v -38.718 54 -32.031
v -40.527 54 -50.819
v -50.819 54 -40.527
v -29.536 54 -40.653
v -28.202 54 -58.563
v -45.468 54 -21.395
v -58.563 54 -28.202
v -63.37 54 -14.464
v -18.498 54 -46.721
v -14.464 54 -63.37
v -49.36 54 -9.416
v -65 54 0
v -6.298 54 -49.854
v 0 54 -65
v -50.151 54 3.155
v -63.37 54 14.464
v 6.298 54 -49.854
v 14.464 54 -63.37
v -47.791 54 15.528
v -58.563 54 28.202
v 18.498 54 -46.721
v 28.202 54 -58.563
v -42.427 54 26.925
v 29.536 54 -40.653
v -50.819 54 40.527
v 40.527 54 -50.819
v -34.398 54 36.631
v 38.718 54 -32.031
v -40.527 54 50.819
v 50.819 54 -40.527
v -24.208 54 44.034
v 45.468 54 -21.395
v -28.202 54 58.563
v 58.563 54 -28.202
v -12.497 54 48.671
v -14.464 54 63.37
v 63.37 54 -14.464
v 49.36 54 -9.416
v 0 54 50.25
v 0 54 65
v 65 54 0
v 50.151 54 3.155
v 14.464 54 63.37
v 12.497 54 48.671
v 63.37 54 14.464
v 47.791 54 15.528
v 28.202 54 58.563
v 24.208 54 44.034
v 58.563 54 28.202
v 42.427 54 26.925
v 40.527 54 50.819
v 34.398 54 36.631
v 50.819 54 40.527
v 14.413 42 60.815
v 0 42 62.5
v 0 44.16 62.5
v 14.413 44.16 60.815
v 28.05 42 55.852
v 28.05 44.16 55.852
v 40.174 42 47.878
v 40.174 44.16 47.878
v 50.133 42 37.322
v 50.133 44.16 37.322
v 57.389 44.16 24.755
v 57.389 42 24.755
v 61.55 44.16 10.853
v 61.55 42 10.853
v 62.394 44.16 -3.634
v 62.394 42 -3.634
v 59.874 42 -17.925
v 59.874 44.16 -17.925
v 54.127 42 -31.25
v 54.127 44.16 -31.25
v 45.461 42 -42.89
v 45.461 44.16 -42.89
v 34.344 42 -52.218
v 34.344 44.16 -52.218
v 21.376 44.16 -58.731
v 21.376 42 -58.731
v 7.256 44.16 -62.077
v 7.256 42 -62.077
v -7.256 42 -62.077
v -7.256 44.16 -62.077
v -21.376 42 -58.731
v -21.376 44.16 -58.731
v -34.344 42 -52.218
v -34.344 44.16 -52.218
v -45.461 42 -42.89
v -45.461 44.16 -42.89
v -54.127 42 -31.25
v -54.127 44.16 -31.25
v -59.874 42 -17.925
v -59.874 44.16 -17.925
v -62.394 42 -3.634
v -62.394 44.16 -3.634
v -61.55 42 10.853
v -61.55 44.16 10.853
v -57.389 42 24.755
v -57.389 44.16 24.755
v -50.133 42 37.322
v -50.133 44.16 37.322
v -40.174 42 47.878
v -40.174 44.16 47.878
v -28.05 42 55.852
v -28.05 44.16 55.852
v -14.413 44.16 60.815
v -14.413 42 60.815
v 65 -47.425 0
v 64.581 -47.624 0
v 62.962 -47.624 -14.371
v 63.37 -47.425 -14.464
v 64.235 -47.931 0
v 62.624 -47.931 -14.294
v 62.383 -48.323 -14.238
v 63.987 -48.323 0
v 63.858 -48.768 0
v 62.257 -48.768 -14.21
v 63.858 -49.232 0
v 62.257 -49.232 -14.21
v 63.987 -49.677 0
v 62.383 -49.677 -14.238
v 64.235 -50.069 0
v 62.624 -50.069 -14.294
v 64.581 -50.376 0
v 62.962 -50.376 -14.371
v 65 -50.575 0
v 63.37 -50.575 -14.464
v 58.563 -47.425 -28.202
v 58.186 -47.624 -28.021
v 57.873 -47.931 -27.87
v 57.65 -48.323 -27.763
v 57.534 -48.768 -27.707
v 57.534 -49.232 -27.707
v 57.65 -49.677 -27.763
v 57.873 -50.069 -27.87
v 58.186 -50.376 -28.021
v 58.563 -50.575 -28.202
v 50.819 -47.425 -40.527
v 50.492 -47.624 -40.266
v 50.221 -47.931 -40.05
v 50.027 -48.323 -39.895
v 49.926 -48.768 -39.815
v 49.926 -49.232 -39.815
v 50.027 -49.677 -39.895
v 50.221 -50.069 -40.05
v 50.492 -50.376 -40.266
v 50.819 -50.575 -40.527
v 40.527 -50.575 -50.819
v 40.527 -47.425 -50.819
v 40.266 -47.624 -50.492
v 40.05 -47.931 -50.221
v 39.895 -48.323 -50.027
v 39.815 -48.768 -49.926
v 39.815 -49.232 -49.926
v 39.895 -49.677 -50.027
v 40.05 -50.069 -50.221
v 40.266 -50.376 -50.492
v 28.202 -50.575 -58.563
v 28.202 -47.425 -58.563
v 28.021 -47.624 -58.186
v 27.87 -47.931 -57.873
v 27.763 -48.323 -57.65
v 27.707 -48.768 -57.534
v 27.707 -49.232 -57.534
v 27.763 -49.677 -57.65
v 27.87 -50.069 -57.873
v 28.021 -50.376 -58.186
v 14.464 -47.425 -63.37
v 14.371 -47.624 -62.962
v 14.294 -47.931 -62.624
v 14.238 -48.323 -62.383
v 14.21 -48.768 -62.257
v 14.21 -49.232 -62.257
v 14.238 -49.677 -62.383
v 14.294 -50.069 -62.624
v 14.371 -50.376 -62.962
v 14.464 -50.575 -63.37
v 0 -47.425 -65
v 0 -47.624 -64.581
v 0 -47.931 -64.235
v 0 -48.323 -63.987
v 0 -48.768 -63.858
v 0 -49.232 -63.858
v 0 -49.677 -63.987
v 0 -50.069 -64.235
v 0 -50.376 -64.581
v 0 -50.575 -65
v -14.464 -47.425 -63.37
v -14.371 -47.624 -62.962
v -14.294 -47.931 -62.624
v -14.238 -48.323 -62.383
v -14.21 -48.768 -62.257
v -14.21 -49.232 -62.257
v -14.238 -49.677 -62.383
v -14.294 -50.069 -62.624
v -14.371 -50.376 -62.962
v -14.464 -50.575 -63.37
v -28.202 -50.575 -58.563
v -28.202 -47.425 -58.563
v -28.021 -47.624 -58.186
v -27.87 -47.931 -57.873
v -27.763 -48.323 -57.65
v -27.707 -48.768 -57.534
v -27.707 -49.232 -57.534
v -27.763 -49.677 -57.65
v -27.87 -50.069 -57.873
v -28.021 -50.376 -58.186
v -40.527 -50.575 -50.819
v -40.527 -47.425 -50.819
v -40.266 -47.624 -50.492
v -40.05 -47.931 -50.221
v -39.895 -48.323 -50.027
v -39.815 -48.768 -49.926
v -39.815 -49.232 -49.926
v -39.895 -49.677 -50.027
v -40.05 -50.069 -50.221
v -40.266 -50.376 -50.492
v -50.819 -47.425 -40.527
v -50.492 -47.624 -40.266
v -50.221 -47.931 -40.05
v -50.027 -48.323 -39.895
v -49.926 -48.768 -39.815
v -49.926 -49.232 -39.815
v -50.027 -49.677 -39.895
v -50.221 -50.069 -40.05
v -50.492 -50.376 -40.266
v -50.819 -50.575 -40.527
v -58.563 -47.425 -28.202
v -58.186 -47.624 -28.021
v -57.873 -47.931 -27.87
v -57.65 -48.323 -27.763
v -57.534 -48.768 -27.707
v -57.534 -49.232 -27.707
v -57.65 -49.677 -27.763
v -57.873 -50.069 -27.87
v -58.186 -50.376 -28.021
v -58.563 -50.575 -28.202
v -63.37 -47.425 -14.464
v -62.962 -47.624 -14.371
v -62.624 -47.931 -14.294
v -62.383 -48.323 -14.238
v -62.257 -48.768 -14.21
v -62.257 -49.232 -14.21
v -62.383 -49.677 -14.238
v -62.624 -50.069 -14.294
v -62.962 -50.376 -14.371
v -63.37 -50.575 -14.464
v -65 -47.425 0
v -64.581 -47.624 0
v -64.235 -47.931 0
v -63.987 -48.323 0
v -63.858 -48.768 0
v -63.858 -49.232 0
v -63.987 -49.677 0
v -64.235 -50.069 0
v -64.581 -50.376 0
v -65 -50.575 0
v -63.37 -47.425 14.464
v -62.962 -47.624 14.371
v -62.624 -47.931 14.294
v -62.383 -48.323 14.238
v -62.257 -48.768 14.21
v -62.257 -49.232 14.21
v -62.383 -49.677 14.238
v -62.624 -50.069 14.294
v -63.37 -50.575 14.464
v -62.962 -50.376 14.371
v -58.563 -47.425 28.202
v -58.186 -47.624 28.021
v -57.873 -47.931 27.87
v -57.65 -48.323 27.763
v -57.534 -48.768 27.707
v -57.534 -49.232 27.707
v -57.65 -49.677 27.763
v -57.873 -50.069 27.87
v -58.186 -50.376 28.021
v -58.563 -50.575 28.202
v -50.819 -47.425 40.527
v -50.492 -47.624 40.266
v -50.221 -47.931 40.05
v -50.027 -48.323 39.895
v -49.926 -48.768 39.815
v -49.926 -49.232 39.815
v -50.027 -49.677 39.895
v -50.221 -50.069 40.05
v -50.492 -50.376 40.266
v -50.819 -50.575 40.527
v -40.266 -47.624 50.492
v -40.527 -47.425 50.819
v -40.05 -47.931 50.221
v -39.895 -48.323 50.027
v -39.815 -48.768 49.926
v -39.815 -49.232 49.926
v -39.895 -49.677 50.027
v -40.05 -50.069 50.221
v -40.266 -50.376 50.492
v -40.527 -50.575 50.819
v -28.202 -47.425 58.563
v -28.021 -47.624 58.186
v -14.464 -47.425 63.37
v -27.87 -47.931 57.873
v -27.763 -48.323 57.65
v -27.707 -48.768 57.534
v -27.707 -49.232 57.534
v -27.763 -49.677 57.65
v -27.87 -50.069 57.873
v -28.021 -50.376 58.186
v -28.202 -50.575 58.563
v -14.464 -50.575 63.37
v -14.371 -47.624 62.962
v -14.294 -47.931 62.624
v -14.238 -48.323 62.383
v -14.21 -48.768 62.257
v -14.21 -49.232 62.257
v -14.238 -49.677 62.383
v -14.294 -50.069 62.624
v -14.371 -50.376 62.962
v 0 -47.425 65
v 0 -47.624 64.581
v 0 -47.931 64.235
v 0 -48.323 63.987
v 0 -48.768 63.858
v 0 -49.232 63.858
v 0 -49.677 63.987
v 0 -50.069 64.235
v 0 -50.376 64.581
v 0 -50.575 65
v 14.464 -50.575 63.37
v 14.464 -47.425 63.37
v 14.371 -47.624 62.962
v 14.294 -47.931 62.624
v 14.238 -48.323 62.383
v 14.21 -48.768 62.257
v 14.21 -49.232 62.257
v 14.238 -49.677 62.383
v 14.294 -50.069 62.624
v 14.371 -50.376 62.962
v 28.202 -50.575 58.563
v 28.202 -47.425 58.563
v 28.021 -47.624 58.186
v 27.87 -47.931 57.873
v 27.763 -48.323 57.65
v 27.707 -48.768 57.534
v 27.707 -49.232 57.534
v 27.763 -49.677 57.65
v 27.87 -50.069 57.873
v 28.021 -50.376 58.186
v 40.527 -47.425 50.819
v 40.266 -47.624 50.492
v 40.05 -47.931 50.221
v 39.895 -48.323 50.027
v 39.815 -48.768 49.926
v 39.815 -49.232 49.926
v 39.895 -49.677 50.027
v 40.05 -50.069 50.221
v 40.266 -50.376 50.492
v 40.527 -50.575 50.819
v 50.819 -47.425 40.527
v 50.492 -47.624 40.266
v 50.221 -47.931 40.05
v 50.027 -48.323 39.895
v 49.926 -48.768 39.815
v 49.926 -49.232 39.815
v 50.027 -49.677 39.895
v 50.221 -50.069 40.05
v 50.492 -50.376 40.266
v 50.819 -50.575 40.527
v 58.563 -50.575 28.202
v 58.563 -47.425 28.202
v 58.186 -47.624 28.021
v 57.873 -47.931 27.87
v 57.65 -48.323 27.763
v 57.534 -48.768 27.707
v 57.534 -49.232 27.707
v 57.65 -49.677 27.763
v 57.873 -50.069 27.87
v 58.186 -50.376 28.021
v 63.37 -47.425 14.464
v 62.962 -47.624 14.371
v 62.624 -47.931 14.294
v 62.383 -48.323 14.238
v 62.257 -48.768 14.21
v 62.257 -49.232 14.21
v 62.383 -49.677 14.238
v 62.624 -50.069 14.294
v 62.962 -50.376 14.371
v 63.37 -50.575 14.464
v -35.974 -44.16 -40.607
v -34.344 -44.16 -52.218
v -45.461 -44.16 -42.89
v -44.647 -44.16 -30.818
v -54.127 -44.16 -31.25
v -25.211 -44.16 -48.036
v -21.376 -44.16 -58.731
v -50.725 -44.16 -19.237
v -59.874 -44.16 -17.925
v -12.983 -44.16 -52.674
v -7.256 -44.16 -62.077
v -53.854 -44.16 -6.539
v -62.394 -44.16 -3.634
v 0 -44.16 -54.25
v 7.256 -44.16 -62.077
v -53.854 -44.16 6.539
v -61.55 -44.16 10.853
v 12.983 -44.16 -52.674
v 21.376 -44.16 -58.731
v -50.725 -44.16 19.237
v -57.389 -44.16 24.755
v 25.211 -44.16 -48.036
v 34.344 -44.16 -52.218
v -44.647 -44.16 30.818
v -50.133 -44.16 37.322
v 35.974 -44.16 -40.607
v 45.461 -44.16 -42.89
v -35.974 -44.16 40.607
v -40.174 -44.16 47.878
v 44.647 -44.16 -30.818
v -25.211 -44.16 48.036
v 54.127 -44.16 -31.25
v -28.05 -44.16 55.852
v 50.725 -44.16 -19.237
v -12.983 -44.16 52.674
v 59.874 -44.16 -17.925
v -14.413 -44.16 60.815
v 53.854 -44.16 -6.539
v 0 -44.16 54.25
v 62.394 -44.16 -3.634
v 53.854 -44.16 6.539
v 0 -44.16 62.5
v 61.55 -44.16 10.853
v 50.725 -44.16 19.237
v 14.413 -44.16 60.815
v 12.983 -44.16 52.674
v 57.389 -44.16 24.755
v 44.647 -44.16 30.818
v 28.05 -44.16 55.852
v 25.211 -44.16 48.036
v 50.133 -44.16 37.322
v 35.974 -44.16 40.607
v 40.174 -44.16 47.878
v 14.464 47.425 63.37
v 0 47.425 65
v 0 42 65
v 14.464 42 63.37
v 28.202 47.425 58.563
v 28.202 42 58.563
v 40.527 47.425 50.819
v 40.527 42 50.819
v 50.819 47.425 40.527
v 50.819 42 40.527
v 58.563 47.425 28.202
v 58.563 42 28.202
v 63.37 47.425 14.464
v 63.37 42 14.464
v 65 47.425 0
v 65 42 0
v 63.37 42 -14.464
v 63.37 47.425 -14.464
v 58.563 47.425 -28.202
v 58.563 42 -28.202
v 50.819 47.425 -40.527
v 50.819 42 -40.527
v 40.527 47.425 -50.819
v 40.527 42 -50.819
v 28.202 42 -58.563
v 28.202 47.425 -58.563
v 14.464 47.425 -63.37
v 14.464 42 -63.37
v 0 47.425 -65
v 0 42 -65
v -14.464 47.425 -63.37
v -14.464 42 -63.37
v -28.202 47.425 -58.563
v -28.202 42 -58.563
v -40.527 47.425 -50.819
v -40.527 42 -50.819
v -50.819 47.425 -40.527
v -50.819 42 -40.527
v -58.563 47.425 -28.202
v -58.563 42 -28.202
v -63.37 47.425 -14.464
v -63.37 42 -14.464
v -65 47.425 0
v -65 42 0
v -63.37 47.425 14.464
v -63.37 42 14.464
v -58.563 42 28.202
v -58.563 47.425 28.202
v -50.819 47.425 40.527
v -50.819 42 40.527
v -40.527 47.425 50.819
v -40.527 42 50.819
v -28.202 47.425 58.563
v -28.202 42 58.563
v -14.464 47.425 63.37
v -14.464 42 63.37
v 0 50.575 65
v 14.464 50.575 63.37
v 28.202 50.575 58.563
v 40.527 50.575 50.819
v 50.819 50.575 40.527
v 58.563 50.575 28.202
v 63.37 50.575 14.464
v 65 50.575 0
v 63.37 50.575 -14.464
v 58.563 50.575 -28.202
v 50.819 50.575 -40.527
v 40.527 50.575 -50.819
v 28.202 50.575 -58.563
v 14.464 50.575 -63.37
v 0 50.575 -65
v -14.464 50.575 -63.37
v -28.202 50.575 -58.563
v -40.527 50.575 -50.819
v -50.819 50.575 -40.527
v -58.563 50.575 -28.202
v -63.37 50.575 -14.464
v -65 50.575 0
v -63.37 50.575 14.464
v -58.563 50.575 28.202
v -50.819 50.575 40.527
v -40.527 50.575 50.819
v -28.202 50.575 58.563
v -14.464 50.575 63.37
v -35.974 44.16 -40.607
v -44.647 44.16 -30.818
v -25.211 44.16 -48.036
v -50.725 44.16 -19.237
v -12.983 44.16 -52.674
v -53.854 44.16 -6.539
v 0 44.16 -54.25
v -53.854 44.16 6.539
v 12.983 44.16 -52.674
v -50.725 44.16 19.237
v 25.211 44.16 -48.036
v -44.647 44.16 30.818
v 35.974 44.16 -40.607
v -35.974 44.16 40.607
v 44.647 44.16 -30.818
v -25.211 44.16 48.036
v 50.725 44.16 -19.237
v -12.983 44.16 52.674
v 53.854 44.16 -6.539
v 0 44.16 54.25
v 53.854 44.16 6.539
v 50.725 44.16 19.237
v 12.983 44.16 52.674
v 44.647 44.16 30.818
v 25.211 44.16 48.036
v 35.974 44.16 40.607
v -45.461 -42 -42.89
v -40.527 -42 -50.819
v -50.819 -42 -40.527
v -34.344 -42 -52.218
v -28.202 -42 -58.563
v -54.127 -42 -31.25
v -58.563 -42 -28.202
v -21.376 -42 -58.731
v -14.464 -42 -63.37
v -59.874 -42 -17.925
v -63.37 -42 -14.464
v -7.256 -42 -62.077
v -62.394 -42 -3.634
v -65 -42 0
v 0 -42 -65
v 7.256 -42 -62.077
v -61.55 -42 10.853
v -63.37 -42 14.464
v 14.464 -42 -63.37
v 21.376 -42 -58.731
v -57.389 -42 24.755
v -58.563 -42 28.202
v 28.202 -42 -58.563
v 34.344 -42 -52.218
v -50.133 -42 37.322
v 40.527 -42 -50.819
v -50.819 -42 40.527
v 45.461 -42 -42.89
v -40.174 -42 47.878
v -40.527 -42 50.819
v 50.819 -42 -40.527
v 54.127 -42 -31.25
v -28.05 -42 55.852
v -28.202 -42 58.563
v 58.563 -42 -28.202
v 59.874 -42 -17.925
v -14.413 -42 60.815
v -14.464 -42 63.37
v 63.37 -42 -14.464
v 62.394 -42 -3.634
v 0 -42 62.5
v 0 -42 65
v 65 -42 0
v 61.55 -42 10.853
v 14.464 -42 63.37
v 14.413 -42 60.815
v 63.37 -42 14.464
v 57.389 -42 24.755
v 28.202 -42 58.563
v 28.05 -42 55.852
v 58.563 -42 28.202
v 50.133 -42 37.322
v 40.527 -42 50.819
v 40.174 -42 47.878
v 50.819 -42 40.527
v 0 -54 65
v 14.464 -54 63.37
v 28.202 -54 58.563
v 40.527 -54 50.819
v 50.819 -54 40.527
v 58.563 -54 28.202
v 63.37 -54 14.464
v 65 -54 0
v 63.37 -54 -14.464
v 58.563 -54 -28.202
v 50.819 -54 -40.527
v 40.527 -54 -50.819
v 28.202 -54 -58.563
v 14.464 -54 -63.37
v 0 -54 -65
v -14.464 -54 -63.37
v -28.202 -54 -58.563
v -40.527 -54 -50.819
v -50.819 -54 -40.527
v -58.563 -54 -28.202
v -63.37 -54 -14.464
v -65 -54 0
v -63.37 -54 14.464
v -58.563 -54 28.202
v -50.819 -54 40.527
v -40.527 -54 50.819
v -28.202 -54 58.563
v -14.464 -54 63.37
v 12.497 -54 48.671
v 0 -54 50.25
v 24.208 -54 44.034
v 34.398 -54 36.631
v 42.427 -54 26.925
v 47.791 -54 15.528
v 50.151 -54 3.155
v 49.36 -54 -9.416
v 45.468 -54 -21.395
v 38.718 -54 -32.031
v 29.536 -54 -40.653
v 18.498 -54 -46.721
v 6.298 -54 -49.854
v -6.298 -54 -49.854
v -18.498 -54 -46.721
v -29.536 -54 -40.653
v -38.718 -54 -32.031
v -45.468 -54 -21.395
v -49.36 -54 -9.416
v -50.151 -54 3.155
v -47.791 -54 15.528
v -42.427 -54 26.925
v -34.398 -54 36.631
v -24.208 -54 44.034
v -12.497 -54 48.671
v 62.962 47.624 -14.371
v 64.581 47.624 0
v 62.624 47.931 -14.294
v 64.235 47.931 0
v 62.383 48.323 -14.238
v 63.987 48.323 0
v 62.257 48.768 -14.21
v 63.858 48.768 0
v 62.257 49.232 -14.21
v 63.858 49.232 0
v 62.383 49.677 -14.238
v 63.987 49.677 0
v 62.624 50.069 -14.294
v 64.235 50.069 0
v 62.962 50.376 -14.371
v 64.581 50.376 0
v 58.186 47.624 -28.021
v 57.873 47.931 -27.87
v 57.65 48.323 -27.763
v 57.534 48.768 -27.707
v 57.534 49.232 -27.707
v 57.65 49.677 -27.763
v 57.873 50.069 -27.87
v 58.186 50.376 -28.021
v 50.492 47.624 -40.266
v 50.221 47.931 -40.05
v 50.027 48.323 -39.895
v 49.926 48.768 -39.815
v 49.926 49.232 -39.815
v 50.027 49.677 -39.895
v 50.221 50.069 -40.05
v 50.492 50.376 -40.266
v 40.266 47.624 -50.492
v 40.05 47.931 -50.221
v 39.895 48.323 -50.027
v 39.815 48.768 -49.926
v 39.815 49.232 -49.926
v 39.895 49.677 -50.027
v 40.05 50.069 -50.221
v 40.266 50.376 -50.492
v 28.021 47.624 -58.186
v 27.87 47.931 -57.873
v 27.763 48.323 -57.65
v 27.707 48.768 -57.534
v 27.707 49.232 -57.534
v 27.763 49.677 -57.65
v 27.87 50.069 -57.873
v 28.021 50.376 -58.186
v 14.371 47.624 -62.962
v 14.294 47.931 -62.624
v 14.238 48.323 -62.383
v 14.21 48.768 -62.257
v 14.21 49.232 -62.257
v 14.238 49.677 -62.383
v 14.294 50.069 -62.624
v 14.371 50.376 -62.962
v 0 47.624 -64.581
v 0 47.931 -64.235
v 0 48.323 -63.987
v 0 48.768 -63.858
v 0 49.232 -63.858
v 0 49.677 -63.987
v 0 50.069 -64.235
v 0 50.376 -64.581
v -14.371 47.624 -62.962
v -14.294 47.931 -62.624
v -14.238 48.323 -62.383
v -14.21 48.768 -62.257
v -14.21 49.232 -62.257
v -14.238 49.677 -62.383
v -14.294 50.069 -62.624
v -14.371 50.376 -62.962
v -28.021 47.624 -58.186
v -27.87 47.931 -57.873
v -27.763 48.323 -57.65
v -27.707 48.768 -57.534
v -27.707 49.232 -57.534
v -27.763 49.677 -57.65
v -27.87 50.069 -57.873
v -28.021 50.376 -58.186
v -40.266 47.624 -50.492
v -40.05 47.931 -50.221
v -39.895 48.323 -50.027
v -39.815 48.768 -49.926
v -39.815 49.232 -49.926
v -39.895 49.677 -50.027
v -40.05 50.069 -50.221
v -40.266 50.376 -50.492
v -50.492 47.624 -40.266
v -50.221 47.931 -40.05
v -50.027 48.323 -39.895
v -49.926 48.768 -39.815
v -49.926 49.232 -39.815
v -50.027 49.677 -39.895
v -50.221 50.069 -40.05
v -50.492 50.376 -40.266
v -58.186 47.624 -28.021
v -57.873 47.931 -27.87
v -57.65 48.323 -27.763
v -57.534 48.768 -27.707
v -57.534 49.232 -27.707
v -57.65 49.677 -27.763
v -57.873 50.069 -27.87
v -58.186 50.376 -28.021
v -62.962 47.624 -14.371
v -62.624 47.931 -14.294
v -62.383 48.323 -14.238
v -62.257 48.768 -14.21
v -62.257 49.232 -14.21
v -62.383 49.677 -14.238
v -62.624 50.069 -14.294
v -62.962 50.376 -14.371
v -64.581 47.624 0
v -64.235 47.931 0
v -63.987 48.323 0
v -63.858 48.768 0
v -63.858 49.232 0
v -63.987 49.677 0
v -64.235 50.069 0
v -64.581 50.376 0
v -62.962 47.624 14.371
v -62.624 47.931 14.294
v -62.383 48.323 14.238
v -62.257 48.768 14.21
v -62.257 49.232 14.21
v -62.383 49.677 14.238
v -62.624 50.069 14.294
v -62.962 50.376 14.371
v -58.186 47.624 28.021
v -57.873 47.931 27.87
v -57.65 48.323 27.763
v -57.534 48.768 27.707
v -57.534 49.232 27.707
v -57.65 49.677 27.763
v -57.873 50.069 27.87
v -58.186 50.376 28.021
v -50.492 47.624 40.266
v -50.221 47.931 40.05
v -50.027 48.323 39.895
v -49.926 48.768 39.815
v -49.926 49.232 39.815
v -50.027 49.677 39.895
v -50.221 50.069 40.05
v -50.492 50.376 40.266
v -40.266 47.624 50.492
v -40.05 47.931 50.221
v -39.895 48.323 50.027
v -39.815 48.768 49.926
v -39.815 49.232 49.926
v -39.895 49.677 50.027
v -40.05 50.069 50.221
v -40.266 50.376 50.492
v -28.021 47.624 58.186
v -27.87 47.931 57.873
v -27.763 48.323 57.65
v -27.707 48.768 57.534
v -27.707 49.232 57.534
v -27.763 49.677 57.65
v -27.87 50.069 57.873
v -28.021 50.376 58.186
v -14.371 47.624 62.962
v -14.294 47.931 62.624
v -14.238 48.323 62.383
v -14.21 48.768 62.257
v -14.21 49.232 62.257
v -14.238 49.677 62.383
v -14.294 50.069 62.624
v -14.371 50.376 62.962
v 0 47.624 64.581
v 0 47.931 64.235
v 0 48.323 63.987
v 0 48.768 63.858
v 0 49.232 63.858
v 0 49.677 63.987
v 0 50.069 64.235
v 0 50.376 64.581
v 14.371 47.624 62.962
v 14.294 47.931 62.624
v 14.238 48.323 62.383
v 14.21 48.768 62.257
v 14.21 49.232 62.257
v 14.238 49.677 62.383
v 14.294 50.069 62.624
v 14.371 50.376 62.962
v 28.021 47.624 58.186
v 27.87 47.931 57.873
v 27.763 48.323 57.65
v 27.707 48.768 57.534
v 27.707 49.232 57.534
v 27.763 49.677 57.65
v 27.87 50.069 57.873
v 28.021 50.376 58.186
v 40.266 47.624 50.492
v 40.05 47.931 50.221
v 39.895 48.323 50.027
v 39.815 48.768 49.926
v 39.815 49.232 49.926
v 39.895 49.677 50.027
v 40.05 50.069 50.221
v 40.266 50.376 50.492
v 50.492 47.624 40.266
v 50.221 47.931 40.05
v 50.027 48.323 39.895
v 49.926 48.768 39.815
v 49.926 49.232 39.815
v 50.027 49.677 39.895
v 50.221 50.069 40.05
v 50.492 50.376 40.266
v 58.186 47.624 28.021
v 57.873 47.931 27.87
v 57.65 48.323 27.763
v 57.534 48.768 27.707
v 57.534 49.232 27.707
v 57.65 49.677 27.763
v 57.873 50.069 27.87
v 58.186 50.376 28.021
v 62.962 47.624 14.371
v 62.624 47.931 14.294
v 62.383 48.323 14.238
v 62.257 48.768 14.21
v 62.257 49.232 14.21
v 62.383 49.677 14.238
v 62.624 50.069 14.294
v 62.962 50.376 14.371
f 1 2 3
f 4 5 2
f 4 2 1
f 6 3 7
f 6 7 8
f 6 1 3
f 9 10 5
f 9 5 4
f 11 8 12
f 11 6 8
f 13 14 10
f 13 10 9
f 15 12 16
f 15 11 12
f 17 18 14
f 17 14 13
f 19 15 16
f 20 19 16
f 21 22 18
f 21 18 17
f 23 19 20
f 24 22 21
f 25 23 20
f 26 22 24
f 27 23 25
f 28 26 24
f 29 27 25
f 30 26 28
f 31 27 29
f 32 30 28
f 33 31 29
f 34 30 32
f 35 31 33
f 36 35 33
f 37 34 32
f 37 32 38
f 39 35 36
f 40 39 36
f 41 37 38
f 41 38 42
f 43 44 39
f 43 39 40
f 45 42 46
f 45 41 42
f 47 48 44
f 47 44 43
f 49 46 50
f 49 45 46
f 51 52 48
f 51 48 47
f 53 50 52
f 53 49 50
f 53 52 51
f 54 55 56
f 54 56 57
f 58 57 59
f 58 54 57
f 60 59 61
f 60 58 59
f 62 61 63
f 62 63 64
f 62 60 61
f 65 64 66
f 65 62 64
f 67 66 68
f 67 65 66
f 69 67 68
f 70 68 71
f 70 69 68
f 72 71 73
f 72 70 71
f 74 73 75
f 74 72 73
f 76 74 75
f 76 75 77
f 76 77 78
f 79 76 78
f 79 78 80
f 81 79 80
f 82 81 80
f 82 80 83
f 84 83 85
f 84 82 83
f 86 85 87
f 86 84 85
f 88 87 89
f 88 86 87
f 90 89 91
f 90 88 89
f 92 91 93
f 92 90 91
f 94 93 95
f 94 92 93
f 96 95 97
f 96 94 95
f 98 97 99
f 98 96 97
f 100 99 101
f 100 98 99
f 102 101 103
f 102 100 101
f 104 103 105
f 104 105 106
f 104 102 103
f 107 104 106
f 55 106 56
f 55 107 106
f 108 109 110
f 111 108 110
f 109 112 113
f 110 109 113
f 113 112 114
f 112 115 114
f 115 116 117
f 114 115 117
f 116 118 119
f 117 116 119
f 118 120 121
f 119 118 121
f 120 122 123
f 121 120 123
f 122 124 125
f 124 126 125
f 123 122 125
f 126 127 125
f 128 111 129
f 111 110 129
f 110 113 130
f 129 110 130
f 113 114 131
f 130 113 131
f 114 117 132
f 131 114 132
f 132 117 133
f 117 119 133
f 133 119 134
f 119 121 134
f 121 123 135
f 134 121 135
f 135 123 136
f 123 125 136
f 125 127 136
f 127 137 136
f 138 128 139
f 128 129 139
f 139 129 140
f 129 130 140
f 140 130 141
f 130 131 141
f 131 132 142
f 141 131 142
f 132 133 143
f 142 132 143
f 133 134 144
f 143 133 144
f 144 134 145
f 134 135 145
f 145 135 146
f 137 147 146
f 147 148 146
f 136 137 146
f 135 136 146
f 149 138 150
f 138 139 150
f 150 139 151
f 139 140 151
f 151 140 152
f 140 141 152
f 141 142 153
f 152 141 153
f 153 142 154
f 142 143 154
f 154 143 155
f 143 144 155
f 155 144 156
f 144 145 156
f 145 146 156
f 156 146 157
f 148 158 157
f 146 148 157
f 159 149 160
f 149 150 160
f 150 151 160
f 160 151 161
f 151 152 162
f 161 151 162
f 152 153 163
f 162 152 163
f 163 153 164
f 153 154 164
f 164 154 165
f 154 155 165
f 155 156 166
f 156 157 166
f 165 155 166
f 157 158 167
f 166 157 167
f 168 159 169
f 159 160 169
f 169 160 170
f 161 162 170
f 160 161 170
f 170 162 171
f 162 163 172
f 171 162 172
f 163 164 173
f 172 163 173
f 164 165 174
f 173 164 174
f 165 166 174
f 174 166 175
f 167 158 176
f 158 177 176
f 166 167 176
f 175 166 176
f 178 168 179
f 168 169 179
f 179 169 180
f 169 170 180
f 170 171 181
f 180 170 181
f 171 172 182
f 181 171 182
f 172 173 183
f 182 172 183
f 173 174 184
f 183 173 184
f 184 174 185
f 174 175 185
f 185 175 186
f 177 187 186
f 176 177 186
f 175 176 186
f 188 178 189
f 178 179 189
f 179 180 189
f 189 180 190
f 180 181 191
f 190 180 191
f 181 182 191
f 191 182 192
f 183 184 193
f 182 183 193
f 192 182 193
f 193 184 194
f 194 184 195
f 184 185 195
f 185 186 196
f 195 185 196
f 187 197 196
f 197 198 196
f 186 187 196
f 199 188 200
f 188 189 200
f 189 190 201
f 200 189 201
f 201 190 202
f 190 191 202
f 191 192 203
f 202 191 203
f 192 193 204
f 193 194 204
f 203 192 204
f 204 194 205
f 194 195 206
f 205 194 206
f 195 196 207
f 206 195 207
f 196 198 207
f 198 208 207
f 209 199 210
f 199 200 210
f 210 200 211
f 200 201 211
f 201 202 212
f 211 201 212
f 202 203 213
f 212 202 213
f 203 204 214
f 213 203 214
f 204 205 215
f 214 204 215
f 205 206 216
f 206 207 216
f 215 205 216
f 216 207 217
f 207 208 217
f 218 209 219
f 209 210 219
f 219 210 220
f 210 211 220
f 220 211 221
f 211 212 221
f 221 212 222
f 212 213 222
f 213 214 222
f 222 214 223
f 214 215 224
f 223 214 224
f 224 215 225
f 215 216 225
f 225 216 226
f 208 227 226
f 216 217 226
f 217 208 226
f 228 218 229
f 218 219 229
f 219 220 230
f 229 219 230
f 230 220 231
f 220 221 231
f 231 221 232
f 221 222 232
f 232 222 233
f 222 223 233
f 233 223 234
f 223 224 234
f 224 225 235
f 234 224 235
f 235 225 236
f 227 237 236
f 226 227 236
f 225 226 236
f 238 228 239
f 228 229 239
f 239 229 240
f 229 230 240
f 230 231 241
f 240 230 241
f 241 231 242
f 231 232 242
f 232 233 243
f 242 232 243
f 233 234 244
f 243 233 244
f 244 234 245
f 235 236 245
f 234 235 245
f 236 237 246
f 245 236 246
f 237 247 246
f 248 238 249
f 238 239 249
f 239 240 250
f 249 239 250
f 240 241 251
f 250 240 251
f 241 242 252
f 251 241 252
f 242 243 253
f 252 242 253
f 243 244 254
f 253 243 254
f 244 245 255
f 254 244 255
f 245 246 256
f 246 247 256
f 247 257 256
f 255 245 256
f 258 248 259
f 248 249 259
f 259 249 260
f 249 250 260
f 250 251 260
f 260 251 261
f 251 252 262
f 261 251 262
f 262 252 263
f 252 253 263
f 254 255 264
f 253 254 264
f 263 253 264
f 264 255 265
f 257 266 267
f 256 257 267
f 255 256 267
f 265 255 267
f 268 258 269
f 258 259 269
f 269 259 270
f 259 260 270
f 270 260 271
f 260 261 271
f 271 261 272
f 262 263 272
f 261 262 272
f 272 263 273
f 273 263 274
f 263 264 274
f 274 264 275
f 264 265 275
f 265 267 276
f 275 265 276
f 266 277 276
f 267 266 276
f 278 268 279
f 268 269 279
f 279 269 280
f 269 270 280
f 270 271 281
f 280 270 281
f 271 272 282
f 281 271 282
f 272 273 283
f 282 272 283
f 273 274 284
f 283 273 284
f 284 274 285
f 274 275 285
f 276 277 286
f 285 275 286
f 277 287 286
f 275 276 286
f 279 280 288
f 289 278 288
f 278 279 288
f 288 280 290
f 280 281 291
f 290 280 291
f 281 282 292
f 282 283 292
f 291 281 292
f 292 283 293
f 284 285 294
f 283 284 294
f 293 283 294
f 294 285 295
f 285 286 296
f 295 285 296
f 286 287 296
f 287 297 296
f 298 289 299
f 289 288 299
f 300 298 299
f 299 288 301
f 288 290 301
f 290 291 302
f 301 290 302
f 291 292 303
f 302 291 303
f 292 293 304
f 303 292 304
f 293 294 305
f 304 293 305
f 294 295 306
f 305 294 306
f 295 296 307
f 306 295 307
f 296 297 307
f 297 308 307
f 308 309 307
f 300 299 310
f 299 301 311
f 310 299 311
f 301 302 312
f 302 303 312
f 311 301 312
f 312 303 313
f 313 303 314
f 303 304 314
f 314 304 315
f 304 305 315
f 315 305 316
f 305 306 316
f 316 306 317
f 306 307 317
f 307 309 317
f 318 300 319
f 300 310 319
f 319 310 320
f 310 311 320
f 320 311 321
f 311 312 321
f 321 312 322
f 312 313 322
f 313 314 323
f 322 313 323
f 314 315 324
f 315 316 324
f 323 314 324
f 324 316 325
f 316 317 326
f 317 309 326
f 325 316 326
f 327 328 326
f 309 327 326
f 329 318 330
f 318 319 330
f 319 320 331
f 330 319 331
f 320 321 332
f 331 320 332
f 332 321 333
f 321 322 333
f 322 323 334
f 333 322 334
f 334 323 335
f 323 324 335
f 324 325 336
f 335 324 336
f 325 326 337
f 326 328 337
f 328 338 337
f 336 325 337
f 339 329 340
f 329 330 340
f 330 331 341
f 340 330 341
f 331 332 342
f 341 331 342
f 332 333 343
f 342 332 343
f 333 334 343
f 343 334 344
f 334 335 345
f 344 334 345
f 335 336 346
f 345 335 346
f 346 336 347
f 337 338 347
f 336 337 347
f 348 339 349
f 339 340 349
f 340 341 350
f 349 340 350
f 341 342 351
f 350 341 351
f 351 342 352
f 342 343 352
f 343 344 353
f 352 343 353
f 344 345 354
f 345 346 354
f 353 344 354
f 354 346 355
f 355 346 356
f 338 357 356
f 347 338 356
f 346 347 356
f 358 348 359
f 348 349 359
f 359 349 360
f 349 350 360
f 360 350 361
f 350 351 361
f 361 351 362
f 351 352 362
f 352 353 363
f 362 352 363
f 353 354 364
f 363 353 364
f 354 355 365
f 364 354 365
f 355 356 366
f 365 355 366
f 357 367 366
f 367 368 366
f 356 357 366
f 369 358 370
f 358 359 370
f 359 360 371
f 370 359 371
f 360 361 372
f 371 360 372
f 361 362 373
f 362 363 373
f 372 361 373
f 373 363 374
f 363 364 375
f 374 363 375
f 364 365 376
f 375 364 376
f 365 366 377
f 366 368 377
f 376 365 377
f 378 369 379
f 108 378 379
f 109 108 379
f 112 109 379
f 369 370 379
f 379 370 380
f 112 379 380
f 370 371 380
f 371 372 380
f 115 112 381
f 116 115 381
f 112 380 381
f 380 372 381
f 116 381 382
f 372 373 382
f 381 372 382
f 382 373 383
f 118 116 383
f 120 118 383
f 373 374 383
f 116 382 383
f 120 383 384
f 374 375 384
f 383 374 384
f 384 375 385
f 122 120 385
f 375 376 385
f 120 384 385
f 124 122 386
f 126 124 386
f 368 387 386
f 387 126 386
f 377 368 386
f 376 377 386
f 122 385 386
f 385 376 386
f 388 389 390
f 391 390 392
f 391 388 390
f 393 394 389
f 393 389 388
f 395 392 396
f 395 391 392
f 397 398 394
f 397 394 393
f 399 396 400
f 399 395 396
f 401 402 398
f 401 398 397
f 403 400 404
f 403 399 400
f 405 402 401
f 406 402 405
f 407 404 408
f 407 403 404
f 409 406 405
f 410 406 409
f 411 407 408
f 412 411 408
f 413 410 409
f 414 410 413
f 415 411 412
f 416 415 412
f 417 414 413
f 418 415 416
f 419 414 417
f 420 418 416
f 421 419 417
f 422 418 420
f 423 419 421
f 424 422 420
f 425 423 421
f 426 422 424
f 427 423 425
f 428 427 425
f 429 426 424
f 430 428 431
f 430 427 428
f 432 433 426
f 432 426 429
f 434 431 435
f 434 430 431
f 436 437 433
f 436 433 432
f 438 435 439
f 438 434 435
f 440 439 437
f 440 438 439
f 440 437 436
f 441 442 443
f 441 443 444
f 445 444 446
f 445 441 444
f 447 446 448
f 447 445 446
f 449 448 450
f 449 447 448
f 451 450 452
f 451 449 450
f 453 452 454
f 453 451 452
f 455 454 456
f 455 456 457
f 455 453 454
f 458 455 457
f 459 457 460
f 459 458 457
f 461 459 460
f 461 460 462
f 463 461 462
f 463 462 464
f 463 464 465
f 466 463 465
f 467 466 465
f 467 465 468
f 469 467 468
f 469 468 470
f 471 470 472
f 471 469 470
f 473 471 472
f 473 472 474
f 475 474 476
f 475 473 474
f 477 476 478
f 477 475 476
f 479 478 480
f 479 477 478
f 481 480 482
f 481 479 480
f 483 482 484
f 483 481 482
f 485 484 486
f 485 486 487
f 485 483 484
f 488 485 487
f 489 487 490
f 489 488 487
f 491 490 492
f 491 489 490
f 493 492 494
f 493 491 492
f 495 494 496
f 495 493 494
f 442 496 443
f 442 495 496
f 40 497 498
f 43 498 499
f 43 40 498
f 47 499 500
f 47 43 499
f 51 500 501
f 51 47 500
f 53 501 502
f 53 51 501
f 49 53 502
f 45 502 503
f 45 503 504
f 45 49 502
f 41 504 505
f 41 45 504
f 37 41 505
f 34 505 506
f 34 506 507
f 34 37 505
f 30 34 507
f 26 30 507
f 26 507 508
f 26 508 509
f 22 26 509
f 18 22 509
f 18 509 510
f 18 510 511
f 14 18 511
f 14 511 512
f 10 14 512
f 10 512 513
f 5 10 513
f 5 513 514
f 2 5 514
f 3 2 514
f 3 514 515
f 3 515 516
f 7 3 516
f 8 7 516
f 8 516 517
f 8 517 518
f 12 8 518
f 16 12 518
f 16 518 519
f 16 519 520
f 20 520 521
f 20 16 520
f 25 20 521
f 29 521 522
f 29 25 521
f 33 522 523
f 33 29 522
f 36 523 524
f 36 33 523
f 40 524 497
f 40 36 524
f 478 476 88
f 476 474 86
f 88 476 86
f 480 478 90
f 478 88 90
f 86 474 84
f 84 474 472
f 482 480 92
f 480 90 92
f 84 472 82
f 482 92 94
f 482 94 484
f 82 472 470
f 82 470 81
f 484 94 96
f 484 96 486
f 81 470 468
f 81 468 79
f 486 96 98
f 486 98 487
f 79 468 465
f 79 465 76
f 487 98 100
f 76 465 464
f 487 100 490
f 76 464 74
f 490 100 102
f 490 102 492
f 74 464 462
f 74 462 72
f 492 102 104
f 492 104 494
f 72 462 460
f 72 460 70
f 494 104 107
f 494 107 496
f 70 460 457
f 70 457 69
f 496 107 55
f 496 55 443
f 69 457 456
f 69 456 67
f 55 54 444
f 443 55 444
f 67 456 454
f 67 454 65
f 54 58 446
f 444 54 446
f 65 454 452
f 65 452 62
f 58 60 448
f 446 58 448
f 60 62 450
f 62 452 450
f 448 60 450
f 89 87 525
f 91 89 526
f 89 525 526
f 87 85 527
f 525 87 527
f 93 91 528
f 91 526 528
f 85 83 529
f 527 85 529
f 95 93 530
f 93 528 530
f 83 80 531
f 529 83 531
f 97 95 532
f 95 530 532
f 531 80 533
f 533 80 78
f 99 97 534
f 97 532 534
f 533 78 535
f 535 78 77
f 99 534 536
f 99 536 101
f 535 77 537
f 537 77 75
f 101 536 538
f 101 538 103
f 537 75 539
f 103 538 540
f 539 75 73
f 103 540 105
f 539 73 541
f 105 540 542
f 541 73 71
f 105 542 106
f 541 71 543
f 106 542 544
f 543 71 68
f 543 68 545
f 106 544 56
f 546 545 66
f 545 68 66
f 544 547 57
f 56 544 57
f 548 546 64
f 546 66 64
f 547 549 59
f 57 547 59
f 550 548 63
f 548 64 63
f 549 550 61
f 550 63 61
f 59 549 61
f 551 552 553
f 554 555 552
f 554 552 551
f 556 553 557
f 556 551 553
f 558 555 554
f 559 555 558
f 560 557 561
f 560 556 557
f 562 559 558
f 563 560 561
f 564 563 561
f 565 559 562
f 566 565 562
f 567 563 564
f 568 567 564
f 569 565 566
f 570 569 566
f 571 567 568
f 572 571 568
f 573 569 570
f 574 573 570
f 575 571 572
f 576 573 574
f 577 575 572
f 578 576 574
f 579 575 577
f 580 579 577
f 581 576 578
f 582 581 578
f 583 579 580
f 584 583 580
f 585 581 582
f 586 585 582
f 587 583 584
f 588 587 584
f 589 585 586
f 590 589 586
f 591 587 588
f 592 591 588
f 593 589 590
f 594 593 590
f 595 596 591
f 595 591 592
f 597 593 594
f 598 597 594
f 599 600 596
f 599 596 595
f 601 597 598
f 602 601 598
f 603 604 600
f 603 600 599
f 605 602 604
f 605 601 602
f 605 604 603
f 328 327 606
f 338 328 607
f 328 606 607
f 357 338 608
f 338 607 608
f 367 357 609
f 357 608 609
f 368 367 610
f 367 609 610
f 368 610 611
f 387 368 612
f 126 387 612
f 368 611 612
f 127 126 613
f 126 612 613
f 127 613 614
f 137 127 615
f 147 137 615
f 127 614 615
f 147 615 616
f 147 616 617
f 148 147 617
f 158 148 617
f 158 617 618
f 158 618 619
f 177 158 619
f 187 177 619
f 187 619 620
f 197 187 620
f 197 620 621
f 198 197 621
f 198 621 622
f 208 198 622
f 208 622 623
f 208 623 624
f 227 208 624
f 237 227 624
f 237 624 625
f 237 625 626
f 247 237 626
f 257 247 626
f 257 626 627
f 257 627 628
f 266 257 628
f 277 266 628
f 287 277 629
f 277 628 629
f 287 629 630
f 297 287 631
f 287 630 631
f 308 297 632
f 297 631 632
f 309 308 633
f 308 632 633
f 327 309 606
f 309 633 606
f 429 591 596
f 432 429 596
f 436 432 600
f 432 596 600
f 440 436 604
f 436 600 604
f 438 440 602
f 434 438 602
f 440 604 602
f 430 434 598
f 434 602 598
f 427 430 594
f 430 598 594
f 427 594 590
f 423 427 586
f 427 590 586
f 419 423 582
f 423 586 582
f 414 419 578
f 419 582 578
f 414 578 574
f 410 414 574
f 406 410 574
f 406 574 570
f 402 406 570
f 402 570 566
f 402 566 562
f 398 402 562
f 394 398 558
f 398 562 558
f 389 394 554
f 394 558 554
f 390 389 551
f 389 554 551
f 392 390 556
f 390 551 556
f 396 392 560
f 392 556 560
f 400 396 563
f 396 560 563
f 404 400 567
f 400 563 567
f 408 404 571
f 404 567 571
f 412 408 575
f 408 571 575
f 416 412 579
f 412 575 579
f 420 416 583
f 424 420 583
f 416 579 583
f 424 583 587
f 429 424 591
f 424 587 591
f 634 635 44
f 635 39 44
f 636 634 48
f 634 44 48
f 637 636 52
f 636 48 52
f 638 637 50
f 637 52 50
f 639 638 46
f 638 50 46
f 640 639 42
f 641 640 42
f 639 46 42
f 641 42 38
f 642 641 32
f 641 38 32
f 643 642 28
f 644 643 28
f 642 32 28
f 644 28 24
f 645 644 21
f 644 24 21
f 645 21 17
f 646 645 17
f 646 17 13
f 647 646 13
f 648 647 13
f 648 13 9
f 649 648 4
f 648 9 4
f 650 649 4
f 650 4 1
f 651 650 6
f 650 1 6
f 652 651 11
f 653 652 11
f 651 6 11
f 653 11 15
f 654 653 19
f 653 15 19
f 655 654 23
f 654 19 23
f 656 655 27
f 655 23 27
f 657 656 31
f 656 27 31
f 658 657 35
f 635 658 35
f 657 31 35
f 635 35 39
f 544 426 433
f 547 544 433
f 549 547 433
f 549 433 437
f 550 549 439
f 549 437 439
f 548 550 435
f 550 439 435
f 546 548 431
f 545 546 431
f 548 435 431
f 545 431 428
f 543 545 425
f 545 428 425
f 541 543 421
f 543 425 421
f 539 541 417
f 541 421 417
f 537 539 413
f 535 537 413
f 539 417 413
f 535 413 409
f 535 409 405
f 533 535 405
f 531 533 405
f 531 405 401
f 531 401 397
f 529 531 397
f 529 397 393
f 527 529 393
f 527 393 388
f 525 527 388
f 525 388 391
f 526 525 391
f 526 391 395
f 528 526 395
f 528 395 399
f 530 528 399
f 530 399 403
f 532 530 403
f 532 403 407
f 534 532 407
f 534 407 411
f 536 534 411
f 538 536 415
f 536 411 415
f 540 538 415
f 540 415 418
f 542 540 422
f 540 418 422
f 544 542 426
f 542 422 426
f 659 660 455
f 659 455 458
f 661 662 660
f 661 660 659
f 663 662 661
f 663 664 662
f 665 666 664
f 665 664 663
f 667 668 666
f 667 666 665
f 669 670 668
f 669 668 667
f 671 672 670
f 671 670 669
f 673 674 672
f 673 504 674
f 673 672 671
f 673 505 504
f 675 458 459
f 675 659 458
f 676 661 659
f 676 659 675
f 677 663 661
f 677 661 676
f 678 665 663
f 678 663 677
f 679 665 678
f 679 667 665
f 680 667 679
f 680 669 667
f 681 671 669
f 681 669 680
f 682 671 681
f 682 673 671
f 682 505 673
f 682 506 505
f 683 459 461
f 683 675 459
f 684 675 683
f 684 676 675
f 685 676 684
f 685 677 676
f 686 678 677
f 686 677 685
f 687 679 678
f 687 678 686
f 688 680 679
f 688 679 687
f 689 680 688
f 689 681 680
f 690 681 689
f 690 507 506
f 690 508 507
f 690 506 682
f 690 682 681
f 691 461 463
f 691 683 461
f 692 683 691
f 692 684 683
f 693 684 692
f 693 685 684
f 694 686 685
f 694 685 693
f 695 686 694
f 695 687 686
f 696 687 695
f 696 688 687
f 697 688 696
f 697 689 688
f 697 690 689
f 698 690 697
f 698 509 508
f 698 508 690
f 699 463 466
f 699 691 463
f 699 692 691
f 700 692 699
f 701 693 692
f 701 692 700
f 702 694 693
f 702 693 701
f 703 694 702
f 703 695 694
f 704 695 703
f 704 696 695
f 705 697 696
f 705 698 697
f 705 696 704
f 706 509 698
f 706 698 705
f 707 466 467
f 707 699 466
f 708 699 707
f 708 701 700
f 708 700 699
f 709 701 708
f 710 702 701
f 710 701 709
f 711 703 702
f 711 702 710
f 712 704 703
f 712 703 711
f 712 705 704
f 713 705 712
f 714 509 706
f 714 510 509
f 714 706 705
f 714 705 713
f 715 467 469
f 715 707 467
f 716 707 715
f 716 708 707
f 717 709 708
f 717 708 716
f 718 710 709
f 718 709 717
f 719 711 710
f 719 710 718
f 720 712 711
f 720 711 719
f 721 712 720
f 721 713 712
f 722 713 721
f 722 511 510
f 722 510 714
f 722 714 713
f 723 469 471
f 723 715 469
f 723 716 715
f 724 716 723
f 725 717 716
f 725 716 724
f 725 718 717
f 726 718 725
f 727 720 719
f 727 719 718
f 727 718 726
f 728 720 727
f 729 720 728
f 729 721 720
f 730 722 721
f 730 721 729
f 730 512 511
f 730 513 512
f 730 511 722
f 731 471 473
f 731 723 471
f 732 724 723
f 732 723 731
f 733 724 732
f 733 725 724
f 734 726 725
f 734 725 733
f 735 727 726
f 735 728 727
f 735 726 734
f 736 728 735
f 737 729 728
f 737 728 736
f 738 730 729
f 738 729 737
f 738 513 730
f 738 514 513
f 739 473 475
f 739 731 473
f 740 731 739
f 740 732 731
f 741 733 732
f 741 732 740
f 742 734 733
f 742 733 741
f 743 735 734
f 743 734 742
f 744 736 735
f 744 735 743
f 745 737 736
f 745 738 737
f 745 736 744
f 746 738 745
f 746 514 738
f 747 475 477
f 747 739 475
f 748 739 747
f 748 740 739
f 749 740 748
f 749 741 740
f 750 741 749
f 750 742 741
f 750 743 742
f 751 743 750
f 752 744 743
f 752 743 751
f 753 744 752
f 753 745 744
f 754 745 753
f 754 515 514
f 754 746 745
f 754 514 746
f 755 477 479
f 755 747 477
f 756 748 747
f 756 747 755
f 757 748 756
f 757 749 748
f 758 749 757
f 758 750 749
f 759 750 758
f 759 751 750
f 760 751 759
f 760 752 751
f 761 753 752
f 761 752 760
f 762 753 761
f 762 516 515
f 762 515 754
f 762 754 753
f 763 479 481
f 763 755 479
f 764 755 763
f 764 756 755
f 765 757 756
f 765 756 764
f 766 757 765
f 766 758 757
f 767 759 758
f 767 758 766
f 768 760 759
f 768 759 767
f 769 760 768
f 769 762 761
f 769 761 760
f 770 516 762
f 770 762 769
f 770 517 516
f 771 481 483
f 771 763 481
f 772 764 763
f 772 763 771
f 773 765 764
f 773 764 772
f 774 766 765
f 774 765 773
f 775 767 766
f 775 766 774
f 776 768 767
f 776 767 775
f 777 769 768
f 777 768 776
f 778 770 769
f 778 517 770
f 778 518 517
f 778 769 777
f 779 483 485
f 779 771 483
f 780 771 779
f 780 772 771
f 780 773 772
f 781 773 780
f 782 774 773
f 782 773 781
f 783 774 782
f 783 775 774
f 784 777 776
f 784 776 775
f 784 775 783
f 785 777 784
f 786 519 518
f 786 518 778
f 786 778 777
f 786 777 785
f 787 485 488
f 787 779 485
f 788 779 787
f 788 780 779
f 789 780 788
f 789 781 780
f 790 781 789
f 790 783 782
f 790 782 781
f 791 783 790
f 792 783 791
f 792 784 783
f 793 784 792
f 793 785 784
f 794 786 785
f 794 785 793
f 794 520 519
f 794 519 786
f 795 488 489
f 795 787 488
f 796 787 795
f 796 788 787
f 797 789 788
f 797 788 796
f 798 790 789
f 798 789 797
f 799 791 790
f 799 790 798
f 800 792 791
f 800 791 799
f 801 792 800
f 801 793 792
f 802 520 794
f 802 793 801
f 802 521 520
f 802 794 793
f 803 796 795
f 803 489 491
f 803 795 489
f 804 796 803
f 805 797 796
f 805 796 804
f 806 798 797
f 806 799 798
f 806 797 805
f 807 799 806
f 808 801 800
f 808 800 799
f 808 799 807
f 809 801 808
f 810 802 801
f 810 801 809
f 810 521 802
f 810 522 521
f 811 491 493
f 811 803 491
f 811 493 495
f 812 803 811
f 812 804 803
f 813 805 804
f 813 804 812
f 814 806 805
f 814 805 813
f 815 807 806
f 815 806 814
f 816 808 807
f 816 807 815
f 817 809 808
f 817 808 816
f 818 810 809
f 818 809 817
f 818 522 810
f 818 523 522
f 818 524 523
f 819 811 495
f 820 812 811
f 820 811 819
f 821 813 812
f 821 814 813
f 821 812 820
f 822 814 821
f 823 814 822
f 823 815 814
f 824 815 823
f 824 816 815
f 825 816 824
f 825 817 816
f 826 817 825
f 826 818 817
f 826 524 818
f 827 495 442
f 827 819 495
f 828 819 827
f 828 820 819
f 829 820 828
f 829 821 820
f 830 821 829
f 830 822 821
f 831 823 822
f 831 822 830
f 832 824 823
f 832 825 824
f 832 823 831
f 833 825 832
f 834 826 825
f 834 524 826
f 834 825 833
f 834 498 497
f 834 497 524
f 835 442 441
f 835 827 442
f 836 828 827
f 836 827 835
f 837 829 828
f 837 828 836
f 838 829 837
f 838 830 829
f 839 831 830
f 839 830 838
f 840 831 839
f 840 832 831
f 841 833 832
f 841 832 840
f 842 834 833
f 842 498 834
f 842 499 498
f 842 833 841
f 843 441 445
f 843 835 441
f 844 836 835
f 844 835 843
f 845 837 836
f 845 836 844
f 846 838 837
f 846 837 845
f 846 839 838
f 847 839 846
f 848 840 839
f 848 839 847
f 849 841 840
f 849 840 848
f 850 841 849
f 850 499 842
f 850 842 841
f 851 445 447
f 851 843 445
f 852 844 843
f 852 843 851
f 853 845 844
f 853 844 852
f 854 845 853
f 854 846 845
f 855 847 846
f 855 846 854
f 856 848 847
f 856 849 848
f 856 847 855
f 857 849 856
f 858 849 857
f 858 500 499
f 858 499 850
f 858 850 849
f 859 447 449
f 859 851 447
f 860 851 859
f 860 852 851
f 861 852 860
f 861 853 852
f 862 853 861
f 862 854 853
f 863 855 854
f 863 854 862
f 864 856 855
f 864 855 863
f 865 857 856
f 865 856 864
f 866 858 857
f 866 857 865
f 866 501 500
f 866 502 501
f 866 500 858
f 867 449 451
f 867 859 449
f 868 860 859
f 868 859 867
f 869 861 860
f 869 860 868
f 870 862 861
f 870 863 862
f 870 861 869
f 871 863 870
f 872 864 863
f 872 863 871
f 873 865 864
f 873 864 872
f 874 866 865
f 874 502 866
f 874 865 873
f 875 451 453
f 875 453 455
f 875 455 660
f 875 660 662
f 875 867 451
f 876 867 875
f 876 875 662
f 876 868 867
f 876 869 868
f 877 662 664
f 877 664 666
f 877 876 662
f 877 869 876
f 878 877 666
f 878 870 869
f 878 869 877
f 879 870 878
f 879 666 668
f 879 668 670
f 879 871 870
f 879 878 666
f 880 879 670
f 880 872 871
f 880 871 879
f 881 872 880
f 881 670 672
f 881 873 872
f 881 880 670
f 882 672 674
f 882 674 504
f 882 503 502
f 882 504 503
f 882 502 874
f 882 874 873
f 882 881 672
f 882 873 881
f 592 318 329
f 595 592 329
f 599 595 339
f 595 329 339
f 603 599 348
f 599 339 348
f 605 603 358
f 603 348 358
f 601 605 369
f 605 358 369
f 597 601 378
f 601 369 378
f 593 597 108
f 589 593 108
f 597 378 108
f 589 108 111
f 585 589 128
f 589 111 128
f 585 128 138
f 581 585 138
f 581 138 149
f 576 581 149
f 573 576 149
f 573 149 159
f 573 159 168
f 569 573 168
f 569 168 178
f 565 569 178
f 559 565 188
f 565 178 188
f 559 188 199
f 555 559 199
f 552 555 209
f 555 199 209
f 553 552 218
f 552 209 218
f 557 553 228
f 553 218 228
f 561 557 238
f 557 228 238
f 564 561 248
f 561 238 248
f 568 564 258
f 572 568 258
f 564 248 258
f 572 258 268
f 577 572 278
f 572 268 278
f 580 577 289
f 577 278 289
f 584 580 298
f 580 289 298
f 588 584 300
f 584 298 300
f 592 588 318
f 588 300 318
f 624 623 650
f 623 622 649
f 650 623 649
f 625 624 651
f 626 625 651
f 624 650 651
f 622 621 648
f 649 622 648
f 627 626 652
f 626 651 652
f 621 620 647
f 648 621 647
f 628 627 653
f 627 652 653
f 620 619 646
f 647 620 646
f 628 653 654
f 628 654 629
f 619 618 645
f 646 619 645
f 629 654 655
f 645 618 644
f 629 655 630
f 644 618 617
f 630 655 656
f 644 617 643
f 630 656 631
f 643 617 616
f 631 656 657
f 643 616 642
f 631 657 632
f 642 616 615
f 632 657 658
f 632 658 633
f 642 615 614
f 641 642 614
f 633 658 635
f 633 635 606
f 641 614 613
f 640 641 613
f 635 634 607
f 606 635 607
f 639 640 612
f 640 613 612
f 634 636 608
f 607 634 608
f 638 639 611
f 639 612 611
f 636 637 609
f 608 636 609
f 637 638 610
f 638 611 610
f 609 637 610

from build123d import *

# Parameters (mm, degrees)
BOSS_EXTRUDE1_START = -54
SKETCH1_R           = 65
BOSS_EXTRUDE1_DEPTH = 12
SKETCH2_R           = 54.25
CUT_EXTRUDE1_DEPTH  = 6
SKETCH3_R           = 50.25
CUT_EXTRUDE2_DEPTH  = 93.119487623
SKETCH4_R           = 62.5
CUT_EXTRUDE3_DEPTH  = 2.16
BOSS_EXTRUDE2_REACH = 139.31
SKETCH8_R           = 54.25
SKETCH8_R_2         = 50.25


# Read off the part's stored shape, not the designer's step: Cut-Revolve1
with BuildPart() as part:
    # Sketch1 → Boss-Extrude1 (new body)
    with BuildSketch(Plane(origin=(0, 0, 0), x_dir=(1, 0, 0), z_dir=(0, 1, 0)).offset(BOSS_EXTRUDE1_START)):
        with Locations(Location((0, 0, 0), (0, 0, 270))):
            Circle(SKETCH1_R)
    extrude(amount=BOSS_EXTRUDE1_DEPTH)

    # Sketch2 → Cut-Extrude1 (cut)
    with BuildSketch(Plane(origin=(0, -42, 0), x_dir=(1, 0, 0), z_dir=(0, 1, 0))):
        with Locations(Location((0, 0, 0), (0, 0, 270))):
            Circle(SKETCH2_R)
    extrude(amount=-CUT_EXTRUDE1_DEPTH, mode=Mode.SUBTRACT)

    # Sketch3 → Cut-Extrude2 (cut, through all)
    with BuildSketch(Plane(origin=(0, -48, 0), x_dir=(1, 0, 0), z_dir=(0, 1, 0))):
        with Locations(Location((0, 0, 0), (0, 0, 270))):
            Circle(SKETCH3_R)
    extrude(amount=-CUT_EXTRUDE2_DEPTH, mode=Mode.SUBTRACT)

    # Sketch4 → Cut-Extrude3 (cut)
    with BuildSketch(Plane(origin=(0, -42, 0), x_dir=(1, 0, 0), z_dir=(0, 1, 0))):
        with Locations(Location((0, 0, 0), (0, 0, 270))):
            Circle(SKETCH4_R)
    extrude(amount=-CUT_EXTRUDE3_DEPTH, mode=Mode.SUBTRACT)

    # Cut-Revolve1 outline → Cut-Revolve1 (revolve, cut)
    with BuildSketch(Plane.XY):
        with BuildLine():
            Line((65, -50.575), (65, -47.425))
            ThreePointArc((65, -47.425), (63.841807889, -49), (65, -50.575))
        make_face()
    revolve(axis=Axis((0, 0, 0), (0, 1, 0)), mode=Mode.SUBTRACT)


with BuildPart() as body_2:
    # Mirror5: mirrored copy
    add(part.part.mirror(Plane.ZX))

    # Sketch8 → Boss-Extrude2 (add, up to next)
    with BuildSketch(Plane(origin=(0, -48, 0), x_dir=(1, 0, 0), z_dir=(0, 1, 0)), mode=Mode.PRIVATE) as boss_extrude2_sk1:
        with Locations(Location((0, 0, 0), (0, 0, 270))):
            Circle(SKETCH8_R)
        with Locations(Location((0, 0, 0), (0, 0, 270))):
            Circle(SKETCH8_R_2, mode=Mode.SUBTRACT)
    boss_extrude2_tool1 = extrude(boss_extrude2_sk1.sketch, amount=BOSS_EXTRUDE2_REACH, mode=Mode.PRIVATE) - body_2.part

    add(part.part)  # Boss-Extrude2 merges part
    add(boss_extrude2_tool1.solids().sort_by_distance((0, -48, -52.715578))[0])


solid = body_2.part
